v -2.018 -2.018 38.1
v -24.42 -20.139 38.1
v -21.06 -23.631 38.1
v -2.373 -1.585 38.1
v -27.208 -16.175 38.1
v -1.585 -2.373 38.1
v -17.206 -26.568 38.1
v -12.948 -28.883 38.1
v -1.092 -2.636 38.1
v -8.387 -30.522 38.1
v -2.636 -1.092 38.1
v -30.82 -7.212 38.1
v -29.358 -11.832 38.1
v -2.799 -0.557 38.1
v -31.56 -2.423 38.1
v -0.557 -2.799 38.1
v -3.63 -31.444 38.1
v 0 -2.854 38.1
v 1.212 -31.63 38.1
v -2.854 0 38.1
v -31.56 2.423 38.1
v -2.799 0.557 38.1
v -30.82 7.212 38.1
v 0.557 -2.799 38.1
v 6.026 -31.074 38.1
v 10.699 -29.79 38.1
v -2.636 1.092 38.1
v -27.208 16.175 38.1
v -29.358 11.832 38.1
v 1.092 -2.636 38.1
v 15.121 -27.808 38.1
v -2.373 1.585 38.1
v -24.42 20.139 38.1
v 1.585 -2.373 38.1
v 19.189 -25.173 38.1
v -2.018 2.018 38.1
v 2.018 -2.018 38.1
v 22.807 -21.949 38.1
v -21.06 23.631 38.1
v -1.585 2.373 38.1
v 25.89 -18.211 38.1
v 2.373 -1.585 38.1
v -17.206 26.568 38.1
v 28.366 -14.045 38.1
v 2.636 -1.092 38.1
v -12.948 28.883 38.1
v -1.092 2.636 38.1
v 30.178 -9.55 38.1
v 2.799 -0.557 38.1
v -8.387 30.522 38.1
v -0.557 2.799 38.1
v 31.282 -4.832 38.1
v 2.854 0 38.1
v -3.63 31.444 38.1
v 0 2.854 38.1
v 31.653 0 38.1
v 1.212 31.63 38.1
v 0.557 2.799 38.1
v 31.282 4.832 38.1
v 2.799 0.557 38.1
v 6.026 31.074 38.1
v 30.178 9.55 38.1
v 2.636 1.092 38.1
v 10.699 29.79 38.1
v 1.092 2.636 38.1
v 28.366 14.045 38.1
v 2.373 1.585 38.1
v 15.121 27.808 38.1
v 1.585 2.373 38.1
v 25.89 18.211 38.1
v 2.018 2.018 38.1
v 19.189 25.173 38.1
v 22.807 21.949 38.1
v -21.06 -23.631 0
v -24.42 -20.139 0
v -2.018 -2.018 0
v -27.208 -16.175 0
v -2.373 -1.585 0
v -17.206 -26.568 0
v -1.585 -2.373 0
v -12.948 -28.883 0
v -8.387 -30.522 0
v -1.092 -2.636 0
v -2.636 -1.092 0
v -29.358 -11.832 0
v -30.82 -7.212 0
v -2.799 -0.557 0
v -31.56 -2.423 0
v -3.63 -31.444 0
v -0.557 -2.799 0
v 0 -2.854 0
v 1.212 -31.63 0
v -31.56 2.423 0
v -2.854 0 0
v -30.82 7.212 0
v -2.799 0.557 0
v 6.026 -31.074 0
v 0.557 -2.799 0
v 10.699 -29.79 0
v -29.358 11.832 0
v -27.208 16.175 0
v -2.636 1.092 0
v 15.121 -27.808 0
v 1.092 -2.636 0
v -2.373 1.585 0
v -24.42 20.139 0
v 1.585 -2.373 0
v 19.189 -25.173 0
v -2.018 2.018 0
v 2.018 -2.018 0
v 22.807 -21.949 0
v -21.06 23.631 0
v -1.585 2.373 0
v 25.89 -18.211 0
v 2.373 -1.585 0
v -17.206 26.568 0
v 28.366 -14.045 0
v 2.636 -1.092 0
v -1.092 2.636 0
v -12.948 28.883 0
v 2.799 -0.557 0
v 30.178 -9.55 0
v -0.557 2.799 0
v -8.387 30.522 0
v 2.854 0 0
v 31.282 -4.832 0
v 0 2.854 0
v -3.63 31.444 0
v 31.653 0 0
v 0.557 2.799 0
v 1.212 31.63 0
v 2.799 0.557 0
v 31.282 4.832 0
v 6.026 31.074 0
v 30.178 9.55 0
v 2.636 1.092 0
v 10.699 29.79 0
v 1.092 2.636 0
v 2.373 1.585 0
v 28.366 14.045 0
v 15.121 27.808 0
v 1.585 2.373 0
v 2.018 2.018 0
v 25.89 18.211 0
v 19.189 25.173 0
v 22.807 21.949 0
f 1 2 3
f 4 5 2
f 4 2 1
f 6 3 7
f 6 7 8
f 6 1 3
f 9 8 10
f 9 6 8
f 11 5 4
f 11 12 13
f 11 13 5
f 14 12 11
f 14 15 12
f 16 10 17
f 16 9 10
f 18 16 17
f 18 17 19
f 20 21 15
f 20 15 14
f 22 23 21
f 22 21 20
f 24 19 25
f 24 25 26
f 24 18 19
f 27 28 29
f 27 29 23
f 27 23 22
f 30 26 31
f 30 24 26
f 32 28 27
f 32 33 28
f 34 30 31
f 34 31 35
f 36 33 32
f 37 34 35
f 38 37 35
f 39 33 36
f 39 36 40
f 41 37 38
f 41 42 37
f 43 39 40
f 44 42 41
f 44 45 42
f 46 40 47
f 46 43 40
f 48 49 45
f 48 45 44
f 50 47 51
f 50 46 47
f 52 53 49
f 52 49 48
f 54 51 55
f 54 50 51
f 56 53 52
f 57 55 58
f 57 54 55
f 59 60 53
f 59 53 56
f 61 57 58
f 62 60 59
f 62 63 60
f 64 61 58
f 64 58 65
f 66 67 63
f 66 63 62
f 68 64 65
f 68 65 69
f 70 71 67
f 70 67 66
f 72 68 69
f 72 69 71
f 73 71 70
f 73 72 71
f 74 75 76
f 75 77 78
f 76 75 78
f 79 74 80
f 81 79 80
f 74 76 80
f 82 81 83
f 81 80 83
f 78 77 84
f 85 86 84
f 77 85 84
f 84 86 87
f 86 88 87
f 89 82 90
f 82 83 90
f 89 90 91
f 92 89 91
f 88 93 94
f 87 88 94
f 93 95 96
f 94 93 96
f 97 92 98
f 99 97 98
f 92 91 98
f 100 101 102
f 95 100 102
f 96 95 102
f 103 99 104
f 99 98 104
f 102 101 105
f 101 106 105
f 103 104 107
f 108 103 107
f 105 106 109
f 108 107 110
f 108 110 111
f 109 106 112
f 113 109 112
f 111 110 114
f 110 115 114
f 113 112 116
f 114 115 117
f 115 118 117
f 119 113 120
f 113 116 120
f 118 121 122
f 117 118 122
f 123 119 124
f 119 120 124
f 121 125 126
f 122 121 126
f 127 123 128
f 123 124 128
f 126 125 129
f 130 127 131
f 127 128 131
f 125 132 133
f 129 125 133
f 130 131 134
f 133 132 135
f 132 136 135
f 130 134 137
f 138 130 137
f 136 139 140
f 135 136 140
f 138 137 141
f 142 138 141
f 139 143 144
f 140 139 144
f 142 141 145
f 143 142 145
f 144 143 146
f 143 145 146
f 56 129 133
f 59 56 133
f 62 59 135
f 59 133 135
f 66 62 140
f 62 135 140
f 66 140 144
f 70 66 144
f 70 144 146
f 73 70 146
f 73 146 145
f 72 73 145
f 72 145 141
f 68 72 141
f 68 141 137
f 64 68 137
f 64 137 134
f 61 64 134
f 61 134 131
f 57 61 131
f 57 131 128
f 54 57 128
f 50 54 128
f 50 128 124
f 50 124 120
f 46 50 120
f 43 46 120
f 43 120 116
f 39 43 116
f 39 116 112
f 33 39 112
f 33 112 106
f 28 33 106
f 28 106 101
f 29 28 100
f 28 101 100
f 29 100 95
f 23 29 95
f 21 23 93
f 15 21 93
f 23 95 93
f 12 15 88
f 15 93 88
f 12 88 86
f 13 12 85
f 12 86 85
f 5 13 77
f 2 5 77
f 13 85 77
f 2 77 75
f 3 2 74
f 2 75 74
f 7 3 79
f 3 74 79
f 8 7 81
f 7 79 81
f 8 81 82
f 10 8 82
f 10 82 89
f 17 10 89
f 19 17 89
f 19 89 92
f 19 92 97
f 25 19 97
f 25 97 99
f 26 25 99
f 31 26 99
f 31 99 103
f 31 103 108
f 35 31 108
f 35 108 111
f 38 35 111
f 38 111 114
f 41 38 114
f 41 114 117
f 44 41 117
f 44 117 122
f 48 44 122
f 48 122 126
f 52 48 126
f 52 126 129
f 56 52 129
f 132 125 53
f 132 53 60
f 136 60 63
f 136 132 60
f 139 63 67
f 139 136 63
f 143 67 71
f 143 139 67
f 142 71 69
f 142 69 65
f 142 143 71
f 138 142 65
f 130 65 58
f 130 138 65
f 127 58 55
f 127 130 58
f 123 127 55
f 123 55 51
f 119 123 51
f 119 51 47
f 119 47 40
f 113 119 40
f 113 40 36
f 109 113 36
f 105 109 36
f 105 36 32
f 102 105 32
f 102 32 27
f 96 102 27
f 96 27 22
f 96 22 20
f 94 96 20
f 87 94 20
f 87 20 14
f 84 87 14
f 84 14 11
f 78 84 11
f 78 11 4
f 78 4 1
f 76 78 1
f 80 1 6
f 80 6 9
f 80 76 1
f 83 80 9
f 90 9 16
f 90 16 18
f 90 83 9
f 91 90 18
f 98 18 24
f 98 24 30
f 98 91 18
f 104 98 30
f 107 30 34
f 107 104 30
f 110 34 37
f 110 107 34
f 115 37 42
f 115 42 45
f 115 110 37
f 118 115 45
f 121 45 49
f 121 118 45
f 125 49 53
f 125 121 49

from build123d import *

# Parameters (mm, degrees)
F0_R        = 31.6529983533
F0_R_2      = 16.2871330866
F0_R_3      = 2.853540911
F1_DEPTH    = 5.08
F2_DEPTH    = 25.4
F2_FACE_R   = 31.6529983533
F2_FACE_R_2 = 2.853540911
F3_DEPTH    = 7.62


with BuildPart() as f1:
    # F0 (on Top) → F1 (new body)
    with BuildSketch(Plane.XY):
        Circle(F0_R)
        Circle(F0_R_2, mode=Mode.SUBTRACT)
        Circle(F0_R_2)
        Circle(F0_R_3, mode=Mode.SUBTRACT)
    extrude(amount=F1_DEPTH)

    # F2 (add): a face of the model
    f2_faces = [f1.faces().sort_by_distance(p)[0] for p in [
        (-30.7577163621, 0, 5.08),
    ]]
    extrude(f2_faces, amount=F2_DEPTH)

    # F0 (on Top) + F2_face (on face) → F3 (join)
    with BuildSketch(Plane.XY):
        Circle(F0_R)
        Circle(F0_R_2, mode=Mode.SUBTRACT)
    with BuildSketch(Plane.XY.offset(30.48)):
        Circle(F2_FACE_R)
        Circle(F2_FACE_R_2, mode=Mode.SUBTRACT)
    extrude(amount=F3_DEPTH)


solid = f1.part
